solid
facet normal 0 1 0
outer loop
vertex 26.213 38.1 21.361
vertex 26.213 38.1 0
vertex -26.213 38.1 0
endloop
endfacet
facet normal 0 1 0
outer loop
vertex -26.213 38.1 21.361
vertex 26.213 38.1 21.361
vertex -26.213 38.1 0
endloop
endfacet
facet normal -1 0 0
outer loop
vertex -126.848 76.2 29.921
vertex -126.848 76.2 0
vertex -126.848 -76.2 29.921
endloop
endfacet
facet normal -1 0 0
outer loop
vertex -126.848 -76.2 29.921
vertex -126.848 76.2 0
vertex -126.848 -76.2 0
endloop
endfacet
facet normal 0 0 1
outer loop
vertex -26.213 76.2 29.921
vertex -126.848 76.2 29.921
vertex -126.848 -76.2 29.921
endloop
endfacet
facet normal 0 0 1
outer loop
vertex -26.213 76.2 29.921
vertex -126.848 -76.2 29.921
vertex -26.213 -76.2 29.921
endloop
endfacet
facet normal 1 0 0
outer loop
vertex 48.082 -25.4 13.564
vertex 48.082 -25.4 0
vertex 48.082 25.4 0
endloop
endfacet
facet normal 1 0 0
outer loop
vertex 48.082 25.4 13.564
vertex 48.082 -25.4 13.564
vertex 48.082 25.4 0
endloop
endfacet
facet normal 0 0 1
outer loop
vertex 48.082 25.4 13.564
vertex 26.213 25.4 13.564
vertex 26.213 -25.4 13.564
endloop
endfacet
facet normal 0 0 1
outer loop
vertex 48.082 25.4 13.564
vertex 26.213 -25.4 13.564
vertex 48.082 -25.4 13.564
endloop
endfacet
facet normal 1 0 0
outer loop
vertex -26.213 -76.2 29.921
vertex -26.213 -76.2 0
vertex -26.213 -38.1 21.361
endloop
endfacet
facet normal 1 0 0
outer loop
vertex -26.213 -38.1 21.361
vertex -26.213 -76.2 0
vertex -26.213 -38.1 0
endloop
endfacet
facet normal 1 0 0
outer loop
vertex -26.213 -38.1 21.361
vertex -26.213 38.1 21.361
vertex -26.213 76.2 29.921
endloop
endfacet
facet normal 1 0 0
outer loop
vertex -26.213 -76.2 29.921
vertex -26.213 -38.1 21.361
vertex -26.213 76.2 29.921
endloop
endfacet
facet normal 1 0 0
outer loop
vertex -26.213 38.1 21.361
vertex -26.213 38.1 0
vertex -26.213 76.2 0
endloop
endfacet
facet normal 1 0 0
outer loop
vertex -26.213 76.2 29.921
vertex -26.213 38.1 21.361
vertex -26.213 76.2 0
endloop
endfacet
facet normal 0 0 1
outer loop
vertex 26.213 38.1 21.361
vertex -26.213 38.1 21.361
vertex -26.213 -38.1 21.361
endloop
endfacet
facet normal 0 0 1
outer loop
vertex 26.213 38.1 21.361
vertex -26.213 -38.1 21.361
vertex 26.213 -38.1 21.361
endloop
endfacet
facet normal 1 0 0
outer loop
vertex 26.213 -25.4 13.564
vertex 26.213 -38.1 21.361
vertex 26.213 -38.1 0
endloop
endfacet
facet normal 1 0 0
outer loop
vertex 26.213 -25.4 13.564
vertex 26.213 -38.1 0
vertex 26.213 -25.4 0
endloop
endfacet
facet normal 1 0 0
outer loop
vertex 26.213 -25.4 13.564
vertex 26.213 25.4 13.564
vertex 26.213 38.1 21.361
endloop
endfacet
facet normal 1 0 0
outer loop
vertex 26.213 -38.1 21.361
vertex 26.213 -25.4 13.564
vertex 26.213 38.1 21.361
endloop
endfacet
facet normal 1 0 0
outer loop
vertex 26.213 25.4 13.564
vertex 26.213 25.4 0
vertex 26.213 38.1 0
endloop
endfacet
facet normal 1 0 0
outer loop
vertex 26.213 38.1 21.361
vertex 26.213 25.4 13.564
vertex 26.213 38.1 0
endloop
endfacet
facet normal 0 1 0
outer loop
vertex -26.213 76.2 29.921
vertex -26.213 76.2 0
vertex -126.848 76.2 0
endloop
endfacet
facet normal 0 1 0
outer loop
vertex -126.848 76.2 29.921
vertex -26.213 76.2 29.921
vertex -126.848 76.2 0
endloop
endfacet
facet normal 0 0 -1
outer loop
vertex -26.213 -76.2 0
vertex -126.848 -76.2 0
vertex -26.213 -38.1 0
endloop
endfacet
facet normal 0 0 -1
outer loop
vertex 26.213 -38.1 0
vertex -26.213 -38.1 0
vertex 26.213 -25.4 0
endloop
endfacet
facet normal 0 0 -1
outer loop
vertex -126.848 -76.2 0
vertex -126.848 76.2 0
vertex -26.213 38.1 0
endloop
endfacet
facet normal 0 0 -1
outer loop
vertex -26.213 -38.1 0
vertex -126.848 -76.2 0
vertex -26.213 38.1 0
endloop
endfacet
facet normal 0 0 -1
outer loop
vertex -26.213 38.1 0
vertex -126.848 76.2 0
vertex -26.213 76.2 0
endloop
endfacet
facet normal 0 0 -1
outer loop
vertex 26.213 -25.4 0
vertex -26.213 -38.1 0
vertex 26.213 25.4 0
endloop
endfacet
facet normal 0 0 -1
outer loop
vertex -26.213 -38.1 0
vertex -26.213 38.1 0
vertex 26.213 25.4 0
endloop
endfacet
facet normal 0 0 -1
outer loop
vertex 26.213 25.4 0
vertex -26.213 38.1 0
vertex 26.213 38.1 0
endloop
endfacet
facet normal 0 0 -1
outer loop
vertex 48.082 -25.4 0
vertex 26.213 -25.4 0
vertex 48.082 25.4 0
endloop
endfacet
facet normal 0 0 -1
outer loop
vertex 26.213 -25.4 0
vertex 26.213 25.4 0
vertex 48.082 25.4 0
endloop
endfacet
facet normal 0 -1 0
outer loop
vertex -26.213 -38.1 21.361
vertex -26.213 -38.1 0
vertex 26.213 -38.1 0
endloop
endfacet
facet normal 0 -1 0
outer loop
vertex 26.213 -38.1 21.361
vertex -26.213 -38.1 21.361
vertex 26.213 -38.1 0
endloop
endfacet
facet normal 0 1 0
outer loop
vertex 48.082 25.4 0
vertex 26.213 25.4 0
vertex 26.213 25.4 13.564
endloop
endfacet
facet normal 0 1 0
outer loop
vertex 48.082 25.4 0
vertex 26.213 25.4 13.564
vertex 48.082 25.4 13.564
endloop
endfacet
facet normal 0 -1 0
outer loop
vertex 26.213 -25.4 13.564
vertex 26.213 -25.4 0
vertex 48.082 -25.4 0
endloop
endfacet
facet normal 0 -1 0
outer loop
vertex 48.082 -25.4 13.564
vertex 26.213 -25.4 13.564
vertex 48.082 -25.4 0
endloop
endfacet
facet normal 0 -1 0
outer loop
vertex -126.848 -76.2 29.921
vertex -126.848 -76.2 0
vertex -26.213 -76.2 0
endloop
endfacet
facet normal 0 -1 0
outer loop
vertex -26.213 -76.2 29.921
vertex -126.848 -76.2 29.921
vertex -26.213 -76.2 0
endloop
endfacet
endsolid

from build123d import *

# Parameters (mm, degrees)
F1_DEPTH = 29.9212
F2_DEPTH = 21.3614
F0_W     = 21.8694
F0_H     = 50.8
F3_DEPTH = 13.5636


with BuildPart() as f1:
    # F0 (on Top) → F1 (new body)
    with BuildSketch(Plane.XY):
        Polygon((-26.2128, -38.1), (-26.2128, 38.1), (-26.2128, 76.2), (-126.8476, 76.2), (-126.8476, -76.2), (-26.2128, -76.2), align=None)
    extrude(amount=F1_DEPTH)

    # F0 (on Top) → F2 (join)
    with BuildSketch(Plane.XY):
        Polygon((26.2128, 25.4), (26.2128, 38.1), (-26.2128, 38.1), (-26.2128, -38.1), (26.2128, -38.1), (26.2128, -25.4), align=None)
    extrude(amount=F2_DEPTH)

    # F0 (on Top) → F3 (join)
    with BuildSketch(Plane.XY):
        with Locations((37.1475, 0)):
            Rectangle(F0_W, F0_H)
    extrude(amount=F3_DEPTH)


solid = f1.part
